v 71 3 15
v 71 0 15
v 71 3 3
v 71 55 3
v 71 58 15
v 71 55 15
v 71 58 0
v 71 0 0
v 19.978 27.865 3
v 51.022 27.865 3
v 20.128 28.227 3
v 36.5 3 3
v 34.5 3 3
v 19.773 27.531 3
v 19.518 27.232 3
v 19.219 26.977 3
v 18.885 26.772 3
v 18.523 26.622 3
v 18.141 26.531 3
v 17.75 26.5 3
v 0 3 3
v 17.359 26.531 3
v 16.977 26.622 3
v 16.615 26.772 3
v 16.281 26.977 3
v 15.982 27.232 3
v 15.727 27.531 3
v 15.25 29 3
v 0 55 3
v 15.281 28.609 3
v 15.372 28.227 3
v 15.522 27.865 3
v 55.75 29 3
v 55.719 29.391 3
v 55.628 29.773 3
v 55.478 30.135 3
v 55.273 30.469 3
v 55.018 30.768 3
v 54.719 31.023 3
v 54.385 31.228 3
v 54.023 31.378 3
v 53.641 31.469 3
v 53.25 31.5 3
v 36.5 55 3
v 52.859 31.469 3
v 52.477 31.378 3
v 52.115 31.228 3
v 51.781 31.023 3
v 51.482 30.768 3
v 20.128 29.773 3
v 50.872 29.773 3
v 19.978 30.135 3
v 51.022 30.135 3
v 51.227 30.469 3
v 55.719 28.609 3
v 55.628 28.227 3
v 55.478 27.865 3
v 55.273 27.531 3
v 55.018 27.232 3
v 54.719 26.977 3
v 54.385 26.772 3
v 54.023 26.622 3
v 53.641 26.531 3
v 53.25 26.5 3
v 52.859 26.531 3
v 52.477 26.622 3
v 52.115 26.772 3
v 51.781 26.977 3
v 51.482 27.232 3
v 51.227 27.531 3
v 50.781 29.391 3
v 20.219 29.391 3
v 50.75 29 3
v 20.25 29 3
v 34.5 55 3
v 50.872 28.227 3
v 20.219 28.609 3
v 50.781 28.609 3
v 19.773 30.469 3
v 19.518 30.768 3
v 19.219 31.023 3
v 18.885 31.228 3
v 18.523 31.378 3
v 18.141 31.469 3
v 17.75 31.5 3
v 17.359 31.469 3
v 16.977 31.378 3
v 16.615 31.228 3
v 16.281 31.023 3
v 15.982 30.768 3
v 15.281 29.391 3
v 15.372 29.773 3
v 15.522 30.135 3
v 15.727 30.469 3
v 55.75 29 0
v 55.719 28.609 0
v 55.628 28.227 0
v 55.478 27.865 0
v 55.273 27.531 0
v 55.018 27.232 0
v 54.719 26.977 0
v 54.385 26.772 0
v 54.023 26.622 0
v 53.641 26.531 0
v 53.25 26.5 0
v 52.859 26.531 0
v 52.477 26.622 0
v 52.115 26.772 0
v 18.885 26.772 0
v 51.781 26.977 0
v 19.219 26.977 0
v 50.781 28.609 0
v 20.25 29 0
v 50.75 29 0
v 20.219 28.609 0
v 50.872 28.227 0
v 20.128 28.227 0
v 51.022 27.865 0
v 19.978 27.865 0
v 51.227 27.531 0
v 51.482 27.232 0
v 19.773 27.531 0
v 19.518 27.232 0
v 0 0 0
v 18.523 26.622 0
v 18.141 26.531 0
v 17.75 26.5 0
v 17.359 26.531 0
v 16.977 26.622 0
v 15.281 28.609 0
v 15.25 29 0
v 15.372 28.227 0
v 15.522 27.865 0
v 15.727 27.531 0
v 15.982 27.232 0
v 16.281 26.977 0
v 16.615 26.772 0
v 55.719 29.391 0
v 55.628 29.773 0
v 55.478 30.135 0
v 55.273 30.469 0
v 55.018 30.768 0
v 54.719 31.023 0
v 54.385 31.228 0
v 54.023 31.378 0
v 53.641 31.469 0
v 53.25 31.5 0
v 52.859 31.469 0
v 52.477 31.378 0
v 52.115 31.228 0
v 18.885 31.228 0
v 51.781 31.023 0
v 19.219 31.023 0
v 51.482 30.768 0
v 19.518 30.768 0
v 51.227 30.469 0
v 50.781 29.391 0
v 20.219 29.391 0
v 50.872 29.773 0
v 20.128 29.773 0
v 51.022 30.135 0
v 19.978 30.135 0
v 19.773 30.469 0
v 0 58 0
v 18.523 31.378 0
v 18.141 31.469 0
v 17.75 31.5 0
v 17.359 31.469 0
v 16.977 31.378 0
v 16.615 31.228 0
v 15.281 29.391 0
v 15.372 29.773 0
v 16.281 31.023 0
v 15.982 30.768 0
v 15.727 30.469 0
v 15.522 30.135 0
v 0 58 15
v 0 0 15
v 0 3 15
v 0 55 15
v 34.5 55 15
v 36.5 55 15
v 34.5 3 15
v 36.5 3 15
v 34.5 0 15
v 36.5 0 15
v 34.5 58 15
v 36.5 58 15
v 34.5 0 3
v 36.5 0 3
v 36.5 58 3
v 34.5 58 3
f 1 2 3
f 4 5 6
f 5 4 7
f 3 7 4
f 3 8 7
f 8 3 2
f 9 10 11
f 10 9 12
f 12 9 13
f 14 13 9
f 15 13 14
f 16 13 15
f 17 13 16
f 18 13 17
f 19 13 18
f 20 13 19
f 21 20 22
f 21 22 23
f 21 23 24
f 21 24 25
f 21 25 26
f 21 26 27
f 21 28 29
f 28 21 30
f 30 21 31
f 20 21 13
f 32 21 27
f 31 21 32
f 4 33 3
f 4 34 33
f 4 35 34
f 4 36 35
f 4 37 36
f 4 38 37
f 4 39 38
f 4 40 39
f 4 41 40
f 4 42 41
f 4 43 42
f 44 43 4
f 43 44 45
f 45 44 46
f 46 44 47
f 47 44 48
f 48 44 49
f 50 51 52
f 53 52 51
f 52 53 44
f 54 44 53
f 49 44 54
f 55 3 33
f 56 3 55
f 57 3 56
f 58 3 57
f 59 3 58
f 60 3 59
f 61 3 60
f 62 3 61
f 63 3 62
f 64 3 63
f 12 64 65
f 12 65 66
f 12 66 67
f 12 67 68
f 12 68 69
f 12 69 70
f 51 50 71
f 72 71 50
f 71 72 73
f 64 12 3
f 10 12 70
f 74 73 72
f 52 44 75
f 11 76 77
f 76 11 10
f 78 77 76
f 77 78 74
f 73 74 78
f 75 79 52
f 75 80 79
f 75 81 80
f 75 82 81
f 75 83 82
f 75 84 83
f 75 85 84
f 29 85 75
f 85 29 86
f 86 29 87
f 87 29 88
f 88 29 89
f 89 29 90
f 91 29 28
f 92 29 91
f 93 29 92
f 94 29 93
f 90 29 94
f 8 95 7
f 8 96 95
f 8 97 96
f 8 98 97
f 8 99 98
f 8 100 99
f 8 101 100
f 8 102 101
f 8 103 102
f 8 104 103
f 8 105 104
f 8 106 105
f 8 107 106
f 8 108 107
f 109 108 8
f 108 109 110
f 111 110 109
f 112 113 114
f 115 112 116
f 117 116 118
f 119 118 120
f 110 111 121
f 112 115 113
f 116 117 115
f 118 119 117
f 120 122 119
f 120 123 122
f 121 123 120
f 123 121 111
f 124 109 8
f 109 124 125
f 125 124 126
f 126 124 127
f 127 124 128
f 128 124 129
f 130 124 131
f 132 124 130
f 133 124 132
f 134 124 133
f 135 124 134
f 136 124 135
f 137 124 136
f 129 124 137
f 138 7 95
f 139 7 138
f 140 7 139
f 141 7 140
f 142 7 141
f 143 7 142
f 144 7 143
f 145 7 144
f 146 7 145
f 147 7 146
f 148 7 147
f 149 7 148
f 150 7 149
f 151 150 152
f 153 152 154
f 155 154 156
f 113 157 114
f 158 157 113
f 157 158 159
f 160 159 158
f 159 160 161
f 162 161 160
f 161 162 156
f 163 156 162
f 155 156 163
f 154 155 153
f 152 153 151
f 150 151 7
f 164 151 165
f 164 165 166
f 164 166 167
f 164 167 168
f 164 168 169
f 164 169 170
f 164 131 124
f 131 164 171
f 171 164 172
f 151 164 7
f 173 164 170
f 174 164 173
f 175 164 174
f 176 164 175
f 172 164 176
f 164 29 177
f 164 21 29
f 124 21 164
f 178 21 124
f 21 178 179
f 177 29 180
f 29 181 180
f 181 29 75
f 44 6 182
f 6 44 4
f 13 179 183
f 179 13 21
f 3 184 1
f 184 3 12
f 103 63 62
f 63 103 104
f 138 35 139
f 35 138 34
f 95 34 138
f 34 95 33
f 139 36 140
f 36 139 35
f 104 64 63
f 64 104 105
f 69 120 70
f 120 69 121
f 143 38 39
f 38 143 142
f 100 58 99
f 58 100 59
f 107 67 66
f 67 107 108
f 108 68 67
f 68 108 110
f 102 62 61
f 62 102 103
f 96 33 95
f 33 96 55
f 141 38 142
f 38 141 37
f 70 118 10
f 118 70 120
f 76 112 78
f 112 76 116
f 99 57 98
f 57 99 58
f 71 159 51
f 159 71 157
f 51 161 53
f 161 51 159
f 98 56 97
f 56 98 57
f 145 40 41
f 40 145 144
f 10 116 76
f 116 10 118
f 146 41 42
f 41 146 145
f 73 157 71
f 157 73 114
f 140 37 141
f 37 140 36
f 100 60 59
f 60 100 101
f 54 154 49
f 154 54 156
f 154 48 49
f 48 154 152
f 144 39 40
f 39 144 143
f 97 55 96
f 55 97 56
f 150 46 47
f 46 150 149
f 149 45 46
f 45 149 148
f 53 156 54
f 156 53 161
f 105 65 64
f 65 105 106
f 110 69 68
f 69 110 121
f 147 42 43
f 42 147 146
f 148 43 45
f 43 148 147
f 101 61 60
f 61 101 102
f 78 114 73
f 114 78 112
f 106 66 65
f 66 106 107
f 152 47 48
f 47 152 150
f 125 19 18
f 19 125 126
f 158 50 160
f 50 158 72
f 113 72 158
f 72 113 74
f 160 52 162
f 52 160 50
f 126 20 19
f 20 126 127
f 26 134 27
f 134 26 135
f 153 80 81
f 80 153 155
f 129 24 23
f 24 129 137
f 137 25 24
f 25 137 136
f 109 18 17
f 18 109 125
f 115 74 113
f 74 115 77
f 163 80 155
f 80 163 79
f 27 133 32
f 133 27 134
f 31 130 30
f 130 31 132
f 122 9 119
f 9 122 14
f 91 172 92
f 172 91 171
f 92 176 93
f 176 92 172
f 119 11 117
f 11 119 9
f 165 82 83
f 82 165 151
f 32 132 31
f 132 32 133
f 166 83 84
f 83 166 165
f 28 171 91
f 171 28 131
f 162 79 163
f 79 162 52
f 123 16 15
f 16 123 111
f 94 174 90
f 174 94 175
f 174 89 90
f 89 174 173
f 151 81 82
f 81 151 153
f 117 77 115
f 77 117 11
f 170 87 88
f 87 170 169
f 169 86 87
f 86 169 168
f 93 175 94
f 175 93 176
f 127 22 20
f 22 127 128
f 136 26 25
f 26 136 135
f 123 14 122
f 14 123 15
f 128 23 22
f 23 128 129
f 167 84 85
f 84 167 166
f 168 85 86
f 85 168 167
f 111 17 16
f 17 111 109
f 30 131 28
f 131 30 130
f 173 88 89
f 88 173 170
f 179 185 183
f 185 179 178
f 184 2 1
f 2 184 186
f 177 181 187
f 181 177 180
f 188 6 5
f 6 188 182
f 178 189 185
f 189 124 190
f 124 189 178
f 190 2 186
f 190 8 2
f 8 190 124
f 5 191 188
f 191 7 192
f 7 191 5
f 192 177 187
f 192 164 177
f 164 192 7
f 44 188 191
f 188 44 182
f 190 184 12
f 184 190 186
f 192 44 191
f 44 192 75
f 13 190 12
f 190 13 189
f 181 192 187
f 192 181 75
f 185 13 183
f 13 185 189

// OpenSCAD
JOISTING_WIDTH = 71;
JOISTING_HEIGHT = 52;
GUIDE_HEIGHT = 15;
GUIDE_THICKNESS = 3;

HOLE_SPACING = JOISTING_WIDTH / 2;
HOLE_DIAMETER = 5;
HOLE_OFFSET_FROM_CENTER = JOISTING_WIDTH / 4;


WASHER_DIAMETER = 10;
WASHER_THICKNESS = 2;



$fn = 40;
translate([0, GUIDE_THICKNESS, 0])
difference() {
    cube([JOISTING_WIDTH, JOISTING_HEIGHT, GUIDE_THICKNESS]);
    translate([JOISTING_WIDTH / 2 + HOLE_OFFSET_FROM_CENTER, JOISTING_HEIGHT/2, 0]) cylinder(d = HOLE_DIAMETER, h = GUIDE_THICKNESS);
    translate([JOISTING_WIDTH / 2 - HOLE_OFFSET_FROM_CENTER, JOISTING_HEIGHT/2, 0]) cylinder(d = HOLE_DIAMETER, h = GUIDE_THICKNESS);
}

difference() {
    union () {
     cube([JOISTING_WIDTH, GUIDE_THICKNESS, GUIDE_HEIGHT]);
     translate([0, JOISTING_HEIGHT + GUIDE_THICKNESS, 0]) cube([JOISTING_WIDTH, GUIDE_THICKNESS, GUIDE_HEIGHT]);
    }
    color("blue") translate([JOISTING_WIDTH / 2 - 1, 0, GUIDE_THICKNESS]) cube([2, JOISTING_HEIGHT + 2 * GUIDE_THICKNESS, GUIDE_HEIGHT - GUIDE_THICKNESS]);
}
